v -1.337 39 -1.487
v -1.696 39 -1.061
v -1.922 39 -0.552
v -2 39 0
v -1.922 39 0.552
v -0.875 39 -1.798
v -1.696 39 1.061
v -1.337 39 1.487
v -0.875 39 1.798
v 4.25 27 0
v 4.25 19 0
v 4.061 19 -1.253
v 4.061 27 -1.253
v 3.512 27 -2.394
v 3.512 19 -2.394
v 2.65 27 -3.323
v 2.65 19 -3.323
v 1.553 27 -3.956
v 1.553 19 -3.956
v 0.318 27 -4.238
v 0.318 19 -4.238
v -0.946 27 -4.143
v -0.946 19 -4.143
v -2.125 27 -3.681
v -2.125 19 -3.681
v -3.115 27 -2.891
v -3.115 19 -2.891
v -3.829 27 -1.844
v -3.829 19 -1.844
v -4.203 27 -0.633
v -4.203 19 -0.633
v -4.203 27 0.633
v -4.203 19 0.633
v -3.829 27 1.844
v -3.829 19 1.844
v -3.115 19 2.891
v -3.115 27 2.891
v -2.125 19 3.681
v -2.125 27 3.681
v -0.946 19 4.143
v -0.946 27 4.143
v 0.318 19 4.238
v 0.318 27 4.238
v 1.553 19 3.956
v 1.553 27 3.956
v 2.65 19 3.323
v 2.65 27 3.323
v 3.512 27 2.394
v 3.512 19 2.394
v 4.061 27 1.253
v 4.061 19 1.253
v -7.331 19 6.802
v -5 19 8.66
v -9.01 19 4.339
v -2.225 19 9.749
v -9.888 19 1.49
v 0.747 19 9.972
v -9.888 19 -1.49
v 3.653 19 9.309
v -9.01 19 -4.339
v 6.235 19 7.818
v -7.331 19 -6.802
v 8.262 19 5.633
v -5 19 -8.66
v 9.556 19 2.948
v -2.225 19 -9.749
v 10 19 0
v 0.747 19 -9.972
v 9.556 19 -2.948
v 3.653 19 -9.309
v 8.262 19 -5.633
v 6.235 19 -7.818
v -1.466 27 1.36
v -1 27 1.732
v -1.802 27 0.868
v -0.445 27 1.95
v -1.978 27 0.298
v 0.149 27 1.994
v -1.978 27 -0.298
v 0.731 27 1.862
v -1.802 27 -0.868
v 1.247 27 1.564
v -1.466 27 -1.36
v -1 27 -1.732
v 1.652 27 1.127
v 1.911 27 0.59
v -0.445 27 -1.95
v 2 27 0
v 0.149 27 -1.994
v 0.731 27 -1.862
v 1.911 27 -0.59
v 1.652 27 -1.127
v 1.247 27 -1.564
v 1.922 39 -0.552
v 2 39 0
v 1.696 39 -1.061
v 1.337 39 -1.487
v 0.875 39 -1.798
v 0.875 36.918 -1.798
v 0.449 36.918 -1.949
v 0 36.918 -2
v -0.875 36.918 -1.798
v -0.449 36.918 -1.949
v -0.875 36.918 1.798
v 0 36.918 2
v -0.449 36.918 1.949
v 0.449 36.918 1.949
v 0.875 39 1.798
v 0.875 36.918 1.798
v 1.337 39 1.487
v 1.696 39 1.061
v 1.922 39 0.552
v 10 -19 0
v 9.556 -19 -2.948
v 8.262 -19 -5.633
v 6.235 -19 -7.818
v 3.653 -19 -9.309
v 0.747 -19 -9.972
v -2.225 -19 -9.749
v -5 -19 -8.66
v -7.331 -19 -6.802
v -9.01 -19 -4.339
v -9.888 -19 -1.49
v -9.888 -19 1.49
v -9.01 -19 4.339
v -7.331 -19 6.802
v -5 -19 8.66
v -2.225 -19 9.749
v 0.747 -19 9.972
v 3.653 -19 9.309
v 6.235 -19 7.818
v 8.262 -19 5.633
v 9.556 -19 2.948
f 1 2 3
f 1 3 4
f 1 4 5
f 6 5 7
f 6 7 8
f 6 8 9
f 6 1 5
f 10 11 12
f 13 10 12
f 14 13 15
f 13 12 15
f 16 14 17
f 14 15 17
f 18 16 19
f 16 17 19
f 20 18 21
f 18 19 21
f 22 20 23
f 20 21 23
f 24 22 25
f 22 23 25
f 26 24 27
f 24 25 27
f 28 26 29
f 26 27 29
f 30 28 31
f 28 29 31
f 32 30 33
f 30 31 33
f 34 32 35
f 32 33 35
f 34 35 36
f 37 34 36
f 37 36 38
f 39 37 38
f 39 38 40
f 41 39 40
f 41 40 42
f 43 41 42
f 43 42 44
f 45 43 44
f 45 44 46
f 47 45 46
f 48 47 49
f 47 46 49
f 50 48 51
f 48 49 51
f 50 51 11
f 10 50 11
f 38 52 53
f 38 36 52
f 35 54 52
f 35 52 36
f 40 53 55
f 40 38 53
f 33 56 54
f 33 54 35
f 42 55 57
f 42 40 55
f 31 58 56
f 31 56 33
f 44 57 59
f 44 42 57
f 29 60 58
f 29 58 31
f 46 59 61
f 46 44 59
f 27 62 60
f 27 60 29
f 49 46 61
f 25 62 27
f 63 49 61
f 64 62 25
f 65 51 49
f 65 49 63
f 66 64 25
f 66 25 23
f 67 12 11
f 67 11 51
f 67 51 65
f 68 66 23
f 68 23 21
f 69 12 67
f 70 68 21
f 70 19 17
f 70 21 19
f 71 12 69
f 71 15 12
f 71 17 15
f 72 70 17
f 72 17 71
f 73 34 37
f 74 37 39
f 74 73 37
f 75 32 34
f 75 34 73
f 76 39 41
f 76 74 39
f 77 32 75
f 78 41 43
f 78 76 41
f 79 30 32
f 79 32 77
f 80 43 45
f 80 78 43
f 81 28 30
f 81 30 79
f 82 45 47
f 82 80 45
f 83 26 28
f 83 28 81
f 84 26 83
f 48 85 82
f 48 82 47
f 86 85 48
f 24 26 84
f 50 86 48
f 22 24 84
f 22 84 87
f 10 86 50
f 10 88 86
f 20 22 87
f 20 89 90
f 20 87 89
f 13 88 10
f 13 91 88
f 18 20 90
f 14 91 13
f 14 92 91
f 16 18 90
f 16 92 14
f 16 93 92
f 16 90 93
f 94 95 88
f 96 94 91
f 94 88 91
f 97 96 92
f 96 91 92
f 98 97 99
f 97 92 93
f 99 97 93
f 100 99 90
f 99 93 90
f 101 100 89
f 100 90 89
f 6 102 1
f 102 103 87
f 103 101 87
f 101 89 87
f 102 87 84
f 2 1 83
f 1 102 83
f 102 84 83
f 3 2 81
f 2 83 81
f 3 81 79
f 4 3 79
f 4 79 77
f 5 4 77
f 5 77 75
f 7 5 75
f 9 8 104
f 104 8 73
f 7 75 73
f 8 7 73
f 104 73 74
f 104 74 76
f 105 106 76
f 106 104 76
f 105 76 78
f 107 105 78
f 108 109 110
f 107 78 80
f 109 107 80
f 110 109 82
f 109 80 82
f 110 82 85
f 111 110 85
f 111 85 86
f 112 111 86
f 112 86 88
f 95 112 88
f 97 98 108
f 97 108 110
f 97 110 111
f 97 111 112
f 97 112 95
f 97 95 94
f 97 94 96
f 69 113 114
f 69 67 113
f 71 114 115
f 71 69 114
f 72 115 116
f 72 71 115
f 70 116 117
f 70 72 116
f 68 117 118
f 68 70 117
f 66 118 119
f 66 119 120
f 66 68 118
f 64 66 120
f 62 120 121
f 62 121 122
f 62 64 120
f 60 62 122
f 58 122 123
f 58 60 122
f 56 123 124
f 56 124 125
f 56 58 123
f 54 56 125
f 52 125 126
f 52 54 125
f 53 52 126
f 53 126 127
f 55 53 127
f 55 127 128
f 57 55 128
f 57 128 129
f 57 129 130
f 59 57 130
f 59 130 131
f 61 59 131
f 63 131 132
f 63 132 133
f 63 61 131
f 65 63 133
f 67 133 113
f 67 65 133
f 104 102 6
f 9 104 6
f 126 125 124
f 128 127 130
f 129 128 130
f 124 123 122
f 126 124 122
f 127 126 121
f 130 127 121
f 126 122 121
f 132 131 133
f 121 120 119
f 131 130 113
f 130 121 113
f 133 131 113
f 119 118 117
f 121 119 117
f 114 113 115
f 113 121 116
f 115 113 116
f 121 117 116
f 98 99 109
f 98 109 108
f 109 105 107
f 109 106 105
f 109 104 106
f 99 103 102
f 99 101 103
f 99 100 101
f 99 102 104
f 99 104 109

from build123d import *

# Parameters (mm, degrees)
SKETCH1_R               = 10
BOSS_EXTRUDE1_DEPTH     = 19
SKETCH2_R               = 4.25
BOSS_EXTRUDE2_DEPTH     = 8
SKETCH3_R               = 2
BOSS_EXTRUDE3_DEPTH     = 12
SKETCH4_W               = 1.75006174
SKETCH4_H               = 4.164275762
CUT_EXTRUDE1_DEPTH      = 11
CUT_EXTRUDE1_DEPTH_BACK = 11


with BuildPart() as part:
    # Sketch1 → Boss-Extrude1 (new body, symmetric)
    with BuildSketch(Plane(origin=(0, 0, 0), x_dir=(1, 0, 0), z_dir=(0, 1, 0))):
        Circle(SKETCH1_R)
    extrude(amount=BOSS_EXTRUDE1_DEPTH, both=True)

    # Sketch2 → Boss-Extrude2 (add)
    with BuildSketch(Plane(origin=(0, 19, 0), x_dir=(1, 0, 0), z_dir=(0, 1, 0))):
        Circle(SKETCH2_R)
    extrude(amount=BOSS_EXTRUDE2_DEPTH)

    # Sketch3 → Boss-Extrude3 (add)
    with BuildSketch(Plane(origin=(0, 27, 0), x_dir=(1, 0, 0), z_dir=(0, 1, 0))):
        Circle(SKETCH3_R)
    extrude(amount=BOSS_EXTRUDE3_DEPTH)

    # Sketch4 → Cut-Extrude1 (cut, two sides)
    with BuildSketch(Plane.XY) as cut_extrude1_sk:
        with Locations((0, 39)):
            Rectangle(SKETCH4_W, SKETCH4_H)
    extrude(amount=CUT_EXTRUDE1_DEPTH, mode=Mode.SUBTRACT)
    extrude(cut_extrude1_sk.sketch, amount=-CUT_EXTRUDE1_DEPTH_BACK, mode=Mode.SUBTRACT)


solid = part.part
